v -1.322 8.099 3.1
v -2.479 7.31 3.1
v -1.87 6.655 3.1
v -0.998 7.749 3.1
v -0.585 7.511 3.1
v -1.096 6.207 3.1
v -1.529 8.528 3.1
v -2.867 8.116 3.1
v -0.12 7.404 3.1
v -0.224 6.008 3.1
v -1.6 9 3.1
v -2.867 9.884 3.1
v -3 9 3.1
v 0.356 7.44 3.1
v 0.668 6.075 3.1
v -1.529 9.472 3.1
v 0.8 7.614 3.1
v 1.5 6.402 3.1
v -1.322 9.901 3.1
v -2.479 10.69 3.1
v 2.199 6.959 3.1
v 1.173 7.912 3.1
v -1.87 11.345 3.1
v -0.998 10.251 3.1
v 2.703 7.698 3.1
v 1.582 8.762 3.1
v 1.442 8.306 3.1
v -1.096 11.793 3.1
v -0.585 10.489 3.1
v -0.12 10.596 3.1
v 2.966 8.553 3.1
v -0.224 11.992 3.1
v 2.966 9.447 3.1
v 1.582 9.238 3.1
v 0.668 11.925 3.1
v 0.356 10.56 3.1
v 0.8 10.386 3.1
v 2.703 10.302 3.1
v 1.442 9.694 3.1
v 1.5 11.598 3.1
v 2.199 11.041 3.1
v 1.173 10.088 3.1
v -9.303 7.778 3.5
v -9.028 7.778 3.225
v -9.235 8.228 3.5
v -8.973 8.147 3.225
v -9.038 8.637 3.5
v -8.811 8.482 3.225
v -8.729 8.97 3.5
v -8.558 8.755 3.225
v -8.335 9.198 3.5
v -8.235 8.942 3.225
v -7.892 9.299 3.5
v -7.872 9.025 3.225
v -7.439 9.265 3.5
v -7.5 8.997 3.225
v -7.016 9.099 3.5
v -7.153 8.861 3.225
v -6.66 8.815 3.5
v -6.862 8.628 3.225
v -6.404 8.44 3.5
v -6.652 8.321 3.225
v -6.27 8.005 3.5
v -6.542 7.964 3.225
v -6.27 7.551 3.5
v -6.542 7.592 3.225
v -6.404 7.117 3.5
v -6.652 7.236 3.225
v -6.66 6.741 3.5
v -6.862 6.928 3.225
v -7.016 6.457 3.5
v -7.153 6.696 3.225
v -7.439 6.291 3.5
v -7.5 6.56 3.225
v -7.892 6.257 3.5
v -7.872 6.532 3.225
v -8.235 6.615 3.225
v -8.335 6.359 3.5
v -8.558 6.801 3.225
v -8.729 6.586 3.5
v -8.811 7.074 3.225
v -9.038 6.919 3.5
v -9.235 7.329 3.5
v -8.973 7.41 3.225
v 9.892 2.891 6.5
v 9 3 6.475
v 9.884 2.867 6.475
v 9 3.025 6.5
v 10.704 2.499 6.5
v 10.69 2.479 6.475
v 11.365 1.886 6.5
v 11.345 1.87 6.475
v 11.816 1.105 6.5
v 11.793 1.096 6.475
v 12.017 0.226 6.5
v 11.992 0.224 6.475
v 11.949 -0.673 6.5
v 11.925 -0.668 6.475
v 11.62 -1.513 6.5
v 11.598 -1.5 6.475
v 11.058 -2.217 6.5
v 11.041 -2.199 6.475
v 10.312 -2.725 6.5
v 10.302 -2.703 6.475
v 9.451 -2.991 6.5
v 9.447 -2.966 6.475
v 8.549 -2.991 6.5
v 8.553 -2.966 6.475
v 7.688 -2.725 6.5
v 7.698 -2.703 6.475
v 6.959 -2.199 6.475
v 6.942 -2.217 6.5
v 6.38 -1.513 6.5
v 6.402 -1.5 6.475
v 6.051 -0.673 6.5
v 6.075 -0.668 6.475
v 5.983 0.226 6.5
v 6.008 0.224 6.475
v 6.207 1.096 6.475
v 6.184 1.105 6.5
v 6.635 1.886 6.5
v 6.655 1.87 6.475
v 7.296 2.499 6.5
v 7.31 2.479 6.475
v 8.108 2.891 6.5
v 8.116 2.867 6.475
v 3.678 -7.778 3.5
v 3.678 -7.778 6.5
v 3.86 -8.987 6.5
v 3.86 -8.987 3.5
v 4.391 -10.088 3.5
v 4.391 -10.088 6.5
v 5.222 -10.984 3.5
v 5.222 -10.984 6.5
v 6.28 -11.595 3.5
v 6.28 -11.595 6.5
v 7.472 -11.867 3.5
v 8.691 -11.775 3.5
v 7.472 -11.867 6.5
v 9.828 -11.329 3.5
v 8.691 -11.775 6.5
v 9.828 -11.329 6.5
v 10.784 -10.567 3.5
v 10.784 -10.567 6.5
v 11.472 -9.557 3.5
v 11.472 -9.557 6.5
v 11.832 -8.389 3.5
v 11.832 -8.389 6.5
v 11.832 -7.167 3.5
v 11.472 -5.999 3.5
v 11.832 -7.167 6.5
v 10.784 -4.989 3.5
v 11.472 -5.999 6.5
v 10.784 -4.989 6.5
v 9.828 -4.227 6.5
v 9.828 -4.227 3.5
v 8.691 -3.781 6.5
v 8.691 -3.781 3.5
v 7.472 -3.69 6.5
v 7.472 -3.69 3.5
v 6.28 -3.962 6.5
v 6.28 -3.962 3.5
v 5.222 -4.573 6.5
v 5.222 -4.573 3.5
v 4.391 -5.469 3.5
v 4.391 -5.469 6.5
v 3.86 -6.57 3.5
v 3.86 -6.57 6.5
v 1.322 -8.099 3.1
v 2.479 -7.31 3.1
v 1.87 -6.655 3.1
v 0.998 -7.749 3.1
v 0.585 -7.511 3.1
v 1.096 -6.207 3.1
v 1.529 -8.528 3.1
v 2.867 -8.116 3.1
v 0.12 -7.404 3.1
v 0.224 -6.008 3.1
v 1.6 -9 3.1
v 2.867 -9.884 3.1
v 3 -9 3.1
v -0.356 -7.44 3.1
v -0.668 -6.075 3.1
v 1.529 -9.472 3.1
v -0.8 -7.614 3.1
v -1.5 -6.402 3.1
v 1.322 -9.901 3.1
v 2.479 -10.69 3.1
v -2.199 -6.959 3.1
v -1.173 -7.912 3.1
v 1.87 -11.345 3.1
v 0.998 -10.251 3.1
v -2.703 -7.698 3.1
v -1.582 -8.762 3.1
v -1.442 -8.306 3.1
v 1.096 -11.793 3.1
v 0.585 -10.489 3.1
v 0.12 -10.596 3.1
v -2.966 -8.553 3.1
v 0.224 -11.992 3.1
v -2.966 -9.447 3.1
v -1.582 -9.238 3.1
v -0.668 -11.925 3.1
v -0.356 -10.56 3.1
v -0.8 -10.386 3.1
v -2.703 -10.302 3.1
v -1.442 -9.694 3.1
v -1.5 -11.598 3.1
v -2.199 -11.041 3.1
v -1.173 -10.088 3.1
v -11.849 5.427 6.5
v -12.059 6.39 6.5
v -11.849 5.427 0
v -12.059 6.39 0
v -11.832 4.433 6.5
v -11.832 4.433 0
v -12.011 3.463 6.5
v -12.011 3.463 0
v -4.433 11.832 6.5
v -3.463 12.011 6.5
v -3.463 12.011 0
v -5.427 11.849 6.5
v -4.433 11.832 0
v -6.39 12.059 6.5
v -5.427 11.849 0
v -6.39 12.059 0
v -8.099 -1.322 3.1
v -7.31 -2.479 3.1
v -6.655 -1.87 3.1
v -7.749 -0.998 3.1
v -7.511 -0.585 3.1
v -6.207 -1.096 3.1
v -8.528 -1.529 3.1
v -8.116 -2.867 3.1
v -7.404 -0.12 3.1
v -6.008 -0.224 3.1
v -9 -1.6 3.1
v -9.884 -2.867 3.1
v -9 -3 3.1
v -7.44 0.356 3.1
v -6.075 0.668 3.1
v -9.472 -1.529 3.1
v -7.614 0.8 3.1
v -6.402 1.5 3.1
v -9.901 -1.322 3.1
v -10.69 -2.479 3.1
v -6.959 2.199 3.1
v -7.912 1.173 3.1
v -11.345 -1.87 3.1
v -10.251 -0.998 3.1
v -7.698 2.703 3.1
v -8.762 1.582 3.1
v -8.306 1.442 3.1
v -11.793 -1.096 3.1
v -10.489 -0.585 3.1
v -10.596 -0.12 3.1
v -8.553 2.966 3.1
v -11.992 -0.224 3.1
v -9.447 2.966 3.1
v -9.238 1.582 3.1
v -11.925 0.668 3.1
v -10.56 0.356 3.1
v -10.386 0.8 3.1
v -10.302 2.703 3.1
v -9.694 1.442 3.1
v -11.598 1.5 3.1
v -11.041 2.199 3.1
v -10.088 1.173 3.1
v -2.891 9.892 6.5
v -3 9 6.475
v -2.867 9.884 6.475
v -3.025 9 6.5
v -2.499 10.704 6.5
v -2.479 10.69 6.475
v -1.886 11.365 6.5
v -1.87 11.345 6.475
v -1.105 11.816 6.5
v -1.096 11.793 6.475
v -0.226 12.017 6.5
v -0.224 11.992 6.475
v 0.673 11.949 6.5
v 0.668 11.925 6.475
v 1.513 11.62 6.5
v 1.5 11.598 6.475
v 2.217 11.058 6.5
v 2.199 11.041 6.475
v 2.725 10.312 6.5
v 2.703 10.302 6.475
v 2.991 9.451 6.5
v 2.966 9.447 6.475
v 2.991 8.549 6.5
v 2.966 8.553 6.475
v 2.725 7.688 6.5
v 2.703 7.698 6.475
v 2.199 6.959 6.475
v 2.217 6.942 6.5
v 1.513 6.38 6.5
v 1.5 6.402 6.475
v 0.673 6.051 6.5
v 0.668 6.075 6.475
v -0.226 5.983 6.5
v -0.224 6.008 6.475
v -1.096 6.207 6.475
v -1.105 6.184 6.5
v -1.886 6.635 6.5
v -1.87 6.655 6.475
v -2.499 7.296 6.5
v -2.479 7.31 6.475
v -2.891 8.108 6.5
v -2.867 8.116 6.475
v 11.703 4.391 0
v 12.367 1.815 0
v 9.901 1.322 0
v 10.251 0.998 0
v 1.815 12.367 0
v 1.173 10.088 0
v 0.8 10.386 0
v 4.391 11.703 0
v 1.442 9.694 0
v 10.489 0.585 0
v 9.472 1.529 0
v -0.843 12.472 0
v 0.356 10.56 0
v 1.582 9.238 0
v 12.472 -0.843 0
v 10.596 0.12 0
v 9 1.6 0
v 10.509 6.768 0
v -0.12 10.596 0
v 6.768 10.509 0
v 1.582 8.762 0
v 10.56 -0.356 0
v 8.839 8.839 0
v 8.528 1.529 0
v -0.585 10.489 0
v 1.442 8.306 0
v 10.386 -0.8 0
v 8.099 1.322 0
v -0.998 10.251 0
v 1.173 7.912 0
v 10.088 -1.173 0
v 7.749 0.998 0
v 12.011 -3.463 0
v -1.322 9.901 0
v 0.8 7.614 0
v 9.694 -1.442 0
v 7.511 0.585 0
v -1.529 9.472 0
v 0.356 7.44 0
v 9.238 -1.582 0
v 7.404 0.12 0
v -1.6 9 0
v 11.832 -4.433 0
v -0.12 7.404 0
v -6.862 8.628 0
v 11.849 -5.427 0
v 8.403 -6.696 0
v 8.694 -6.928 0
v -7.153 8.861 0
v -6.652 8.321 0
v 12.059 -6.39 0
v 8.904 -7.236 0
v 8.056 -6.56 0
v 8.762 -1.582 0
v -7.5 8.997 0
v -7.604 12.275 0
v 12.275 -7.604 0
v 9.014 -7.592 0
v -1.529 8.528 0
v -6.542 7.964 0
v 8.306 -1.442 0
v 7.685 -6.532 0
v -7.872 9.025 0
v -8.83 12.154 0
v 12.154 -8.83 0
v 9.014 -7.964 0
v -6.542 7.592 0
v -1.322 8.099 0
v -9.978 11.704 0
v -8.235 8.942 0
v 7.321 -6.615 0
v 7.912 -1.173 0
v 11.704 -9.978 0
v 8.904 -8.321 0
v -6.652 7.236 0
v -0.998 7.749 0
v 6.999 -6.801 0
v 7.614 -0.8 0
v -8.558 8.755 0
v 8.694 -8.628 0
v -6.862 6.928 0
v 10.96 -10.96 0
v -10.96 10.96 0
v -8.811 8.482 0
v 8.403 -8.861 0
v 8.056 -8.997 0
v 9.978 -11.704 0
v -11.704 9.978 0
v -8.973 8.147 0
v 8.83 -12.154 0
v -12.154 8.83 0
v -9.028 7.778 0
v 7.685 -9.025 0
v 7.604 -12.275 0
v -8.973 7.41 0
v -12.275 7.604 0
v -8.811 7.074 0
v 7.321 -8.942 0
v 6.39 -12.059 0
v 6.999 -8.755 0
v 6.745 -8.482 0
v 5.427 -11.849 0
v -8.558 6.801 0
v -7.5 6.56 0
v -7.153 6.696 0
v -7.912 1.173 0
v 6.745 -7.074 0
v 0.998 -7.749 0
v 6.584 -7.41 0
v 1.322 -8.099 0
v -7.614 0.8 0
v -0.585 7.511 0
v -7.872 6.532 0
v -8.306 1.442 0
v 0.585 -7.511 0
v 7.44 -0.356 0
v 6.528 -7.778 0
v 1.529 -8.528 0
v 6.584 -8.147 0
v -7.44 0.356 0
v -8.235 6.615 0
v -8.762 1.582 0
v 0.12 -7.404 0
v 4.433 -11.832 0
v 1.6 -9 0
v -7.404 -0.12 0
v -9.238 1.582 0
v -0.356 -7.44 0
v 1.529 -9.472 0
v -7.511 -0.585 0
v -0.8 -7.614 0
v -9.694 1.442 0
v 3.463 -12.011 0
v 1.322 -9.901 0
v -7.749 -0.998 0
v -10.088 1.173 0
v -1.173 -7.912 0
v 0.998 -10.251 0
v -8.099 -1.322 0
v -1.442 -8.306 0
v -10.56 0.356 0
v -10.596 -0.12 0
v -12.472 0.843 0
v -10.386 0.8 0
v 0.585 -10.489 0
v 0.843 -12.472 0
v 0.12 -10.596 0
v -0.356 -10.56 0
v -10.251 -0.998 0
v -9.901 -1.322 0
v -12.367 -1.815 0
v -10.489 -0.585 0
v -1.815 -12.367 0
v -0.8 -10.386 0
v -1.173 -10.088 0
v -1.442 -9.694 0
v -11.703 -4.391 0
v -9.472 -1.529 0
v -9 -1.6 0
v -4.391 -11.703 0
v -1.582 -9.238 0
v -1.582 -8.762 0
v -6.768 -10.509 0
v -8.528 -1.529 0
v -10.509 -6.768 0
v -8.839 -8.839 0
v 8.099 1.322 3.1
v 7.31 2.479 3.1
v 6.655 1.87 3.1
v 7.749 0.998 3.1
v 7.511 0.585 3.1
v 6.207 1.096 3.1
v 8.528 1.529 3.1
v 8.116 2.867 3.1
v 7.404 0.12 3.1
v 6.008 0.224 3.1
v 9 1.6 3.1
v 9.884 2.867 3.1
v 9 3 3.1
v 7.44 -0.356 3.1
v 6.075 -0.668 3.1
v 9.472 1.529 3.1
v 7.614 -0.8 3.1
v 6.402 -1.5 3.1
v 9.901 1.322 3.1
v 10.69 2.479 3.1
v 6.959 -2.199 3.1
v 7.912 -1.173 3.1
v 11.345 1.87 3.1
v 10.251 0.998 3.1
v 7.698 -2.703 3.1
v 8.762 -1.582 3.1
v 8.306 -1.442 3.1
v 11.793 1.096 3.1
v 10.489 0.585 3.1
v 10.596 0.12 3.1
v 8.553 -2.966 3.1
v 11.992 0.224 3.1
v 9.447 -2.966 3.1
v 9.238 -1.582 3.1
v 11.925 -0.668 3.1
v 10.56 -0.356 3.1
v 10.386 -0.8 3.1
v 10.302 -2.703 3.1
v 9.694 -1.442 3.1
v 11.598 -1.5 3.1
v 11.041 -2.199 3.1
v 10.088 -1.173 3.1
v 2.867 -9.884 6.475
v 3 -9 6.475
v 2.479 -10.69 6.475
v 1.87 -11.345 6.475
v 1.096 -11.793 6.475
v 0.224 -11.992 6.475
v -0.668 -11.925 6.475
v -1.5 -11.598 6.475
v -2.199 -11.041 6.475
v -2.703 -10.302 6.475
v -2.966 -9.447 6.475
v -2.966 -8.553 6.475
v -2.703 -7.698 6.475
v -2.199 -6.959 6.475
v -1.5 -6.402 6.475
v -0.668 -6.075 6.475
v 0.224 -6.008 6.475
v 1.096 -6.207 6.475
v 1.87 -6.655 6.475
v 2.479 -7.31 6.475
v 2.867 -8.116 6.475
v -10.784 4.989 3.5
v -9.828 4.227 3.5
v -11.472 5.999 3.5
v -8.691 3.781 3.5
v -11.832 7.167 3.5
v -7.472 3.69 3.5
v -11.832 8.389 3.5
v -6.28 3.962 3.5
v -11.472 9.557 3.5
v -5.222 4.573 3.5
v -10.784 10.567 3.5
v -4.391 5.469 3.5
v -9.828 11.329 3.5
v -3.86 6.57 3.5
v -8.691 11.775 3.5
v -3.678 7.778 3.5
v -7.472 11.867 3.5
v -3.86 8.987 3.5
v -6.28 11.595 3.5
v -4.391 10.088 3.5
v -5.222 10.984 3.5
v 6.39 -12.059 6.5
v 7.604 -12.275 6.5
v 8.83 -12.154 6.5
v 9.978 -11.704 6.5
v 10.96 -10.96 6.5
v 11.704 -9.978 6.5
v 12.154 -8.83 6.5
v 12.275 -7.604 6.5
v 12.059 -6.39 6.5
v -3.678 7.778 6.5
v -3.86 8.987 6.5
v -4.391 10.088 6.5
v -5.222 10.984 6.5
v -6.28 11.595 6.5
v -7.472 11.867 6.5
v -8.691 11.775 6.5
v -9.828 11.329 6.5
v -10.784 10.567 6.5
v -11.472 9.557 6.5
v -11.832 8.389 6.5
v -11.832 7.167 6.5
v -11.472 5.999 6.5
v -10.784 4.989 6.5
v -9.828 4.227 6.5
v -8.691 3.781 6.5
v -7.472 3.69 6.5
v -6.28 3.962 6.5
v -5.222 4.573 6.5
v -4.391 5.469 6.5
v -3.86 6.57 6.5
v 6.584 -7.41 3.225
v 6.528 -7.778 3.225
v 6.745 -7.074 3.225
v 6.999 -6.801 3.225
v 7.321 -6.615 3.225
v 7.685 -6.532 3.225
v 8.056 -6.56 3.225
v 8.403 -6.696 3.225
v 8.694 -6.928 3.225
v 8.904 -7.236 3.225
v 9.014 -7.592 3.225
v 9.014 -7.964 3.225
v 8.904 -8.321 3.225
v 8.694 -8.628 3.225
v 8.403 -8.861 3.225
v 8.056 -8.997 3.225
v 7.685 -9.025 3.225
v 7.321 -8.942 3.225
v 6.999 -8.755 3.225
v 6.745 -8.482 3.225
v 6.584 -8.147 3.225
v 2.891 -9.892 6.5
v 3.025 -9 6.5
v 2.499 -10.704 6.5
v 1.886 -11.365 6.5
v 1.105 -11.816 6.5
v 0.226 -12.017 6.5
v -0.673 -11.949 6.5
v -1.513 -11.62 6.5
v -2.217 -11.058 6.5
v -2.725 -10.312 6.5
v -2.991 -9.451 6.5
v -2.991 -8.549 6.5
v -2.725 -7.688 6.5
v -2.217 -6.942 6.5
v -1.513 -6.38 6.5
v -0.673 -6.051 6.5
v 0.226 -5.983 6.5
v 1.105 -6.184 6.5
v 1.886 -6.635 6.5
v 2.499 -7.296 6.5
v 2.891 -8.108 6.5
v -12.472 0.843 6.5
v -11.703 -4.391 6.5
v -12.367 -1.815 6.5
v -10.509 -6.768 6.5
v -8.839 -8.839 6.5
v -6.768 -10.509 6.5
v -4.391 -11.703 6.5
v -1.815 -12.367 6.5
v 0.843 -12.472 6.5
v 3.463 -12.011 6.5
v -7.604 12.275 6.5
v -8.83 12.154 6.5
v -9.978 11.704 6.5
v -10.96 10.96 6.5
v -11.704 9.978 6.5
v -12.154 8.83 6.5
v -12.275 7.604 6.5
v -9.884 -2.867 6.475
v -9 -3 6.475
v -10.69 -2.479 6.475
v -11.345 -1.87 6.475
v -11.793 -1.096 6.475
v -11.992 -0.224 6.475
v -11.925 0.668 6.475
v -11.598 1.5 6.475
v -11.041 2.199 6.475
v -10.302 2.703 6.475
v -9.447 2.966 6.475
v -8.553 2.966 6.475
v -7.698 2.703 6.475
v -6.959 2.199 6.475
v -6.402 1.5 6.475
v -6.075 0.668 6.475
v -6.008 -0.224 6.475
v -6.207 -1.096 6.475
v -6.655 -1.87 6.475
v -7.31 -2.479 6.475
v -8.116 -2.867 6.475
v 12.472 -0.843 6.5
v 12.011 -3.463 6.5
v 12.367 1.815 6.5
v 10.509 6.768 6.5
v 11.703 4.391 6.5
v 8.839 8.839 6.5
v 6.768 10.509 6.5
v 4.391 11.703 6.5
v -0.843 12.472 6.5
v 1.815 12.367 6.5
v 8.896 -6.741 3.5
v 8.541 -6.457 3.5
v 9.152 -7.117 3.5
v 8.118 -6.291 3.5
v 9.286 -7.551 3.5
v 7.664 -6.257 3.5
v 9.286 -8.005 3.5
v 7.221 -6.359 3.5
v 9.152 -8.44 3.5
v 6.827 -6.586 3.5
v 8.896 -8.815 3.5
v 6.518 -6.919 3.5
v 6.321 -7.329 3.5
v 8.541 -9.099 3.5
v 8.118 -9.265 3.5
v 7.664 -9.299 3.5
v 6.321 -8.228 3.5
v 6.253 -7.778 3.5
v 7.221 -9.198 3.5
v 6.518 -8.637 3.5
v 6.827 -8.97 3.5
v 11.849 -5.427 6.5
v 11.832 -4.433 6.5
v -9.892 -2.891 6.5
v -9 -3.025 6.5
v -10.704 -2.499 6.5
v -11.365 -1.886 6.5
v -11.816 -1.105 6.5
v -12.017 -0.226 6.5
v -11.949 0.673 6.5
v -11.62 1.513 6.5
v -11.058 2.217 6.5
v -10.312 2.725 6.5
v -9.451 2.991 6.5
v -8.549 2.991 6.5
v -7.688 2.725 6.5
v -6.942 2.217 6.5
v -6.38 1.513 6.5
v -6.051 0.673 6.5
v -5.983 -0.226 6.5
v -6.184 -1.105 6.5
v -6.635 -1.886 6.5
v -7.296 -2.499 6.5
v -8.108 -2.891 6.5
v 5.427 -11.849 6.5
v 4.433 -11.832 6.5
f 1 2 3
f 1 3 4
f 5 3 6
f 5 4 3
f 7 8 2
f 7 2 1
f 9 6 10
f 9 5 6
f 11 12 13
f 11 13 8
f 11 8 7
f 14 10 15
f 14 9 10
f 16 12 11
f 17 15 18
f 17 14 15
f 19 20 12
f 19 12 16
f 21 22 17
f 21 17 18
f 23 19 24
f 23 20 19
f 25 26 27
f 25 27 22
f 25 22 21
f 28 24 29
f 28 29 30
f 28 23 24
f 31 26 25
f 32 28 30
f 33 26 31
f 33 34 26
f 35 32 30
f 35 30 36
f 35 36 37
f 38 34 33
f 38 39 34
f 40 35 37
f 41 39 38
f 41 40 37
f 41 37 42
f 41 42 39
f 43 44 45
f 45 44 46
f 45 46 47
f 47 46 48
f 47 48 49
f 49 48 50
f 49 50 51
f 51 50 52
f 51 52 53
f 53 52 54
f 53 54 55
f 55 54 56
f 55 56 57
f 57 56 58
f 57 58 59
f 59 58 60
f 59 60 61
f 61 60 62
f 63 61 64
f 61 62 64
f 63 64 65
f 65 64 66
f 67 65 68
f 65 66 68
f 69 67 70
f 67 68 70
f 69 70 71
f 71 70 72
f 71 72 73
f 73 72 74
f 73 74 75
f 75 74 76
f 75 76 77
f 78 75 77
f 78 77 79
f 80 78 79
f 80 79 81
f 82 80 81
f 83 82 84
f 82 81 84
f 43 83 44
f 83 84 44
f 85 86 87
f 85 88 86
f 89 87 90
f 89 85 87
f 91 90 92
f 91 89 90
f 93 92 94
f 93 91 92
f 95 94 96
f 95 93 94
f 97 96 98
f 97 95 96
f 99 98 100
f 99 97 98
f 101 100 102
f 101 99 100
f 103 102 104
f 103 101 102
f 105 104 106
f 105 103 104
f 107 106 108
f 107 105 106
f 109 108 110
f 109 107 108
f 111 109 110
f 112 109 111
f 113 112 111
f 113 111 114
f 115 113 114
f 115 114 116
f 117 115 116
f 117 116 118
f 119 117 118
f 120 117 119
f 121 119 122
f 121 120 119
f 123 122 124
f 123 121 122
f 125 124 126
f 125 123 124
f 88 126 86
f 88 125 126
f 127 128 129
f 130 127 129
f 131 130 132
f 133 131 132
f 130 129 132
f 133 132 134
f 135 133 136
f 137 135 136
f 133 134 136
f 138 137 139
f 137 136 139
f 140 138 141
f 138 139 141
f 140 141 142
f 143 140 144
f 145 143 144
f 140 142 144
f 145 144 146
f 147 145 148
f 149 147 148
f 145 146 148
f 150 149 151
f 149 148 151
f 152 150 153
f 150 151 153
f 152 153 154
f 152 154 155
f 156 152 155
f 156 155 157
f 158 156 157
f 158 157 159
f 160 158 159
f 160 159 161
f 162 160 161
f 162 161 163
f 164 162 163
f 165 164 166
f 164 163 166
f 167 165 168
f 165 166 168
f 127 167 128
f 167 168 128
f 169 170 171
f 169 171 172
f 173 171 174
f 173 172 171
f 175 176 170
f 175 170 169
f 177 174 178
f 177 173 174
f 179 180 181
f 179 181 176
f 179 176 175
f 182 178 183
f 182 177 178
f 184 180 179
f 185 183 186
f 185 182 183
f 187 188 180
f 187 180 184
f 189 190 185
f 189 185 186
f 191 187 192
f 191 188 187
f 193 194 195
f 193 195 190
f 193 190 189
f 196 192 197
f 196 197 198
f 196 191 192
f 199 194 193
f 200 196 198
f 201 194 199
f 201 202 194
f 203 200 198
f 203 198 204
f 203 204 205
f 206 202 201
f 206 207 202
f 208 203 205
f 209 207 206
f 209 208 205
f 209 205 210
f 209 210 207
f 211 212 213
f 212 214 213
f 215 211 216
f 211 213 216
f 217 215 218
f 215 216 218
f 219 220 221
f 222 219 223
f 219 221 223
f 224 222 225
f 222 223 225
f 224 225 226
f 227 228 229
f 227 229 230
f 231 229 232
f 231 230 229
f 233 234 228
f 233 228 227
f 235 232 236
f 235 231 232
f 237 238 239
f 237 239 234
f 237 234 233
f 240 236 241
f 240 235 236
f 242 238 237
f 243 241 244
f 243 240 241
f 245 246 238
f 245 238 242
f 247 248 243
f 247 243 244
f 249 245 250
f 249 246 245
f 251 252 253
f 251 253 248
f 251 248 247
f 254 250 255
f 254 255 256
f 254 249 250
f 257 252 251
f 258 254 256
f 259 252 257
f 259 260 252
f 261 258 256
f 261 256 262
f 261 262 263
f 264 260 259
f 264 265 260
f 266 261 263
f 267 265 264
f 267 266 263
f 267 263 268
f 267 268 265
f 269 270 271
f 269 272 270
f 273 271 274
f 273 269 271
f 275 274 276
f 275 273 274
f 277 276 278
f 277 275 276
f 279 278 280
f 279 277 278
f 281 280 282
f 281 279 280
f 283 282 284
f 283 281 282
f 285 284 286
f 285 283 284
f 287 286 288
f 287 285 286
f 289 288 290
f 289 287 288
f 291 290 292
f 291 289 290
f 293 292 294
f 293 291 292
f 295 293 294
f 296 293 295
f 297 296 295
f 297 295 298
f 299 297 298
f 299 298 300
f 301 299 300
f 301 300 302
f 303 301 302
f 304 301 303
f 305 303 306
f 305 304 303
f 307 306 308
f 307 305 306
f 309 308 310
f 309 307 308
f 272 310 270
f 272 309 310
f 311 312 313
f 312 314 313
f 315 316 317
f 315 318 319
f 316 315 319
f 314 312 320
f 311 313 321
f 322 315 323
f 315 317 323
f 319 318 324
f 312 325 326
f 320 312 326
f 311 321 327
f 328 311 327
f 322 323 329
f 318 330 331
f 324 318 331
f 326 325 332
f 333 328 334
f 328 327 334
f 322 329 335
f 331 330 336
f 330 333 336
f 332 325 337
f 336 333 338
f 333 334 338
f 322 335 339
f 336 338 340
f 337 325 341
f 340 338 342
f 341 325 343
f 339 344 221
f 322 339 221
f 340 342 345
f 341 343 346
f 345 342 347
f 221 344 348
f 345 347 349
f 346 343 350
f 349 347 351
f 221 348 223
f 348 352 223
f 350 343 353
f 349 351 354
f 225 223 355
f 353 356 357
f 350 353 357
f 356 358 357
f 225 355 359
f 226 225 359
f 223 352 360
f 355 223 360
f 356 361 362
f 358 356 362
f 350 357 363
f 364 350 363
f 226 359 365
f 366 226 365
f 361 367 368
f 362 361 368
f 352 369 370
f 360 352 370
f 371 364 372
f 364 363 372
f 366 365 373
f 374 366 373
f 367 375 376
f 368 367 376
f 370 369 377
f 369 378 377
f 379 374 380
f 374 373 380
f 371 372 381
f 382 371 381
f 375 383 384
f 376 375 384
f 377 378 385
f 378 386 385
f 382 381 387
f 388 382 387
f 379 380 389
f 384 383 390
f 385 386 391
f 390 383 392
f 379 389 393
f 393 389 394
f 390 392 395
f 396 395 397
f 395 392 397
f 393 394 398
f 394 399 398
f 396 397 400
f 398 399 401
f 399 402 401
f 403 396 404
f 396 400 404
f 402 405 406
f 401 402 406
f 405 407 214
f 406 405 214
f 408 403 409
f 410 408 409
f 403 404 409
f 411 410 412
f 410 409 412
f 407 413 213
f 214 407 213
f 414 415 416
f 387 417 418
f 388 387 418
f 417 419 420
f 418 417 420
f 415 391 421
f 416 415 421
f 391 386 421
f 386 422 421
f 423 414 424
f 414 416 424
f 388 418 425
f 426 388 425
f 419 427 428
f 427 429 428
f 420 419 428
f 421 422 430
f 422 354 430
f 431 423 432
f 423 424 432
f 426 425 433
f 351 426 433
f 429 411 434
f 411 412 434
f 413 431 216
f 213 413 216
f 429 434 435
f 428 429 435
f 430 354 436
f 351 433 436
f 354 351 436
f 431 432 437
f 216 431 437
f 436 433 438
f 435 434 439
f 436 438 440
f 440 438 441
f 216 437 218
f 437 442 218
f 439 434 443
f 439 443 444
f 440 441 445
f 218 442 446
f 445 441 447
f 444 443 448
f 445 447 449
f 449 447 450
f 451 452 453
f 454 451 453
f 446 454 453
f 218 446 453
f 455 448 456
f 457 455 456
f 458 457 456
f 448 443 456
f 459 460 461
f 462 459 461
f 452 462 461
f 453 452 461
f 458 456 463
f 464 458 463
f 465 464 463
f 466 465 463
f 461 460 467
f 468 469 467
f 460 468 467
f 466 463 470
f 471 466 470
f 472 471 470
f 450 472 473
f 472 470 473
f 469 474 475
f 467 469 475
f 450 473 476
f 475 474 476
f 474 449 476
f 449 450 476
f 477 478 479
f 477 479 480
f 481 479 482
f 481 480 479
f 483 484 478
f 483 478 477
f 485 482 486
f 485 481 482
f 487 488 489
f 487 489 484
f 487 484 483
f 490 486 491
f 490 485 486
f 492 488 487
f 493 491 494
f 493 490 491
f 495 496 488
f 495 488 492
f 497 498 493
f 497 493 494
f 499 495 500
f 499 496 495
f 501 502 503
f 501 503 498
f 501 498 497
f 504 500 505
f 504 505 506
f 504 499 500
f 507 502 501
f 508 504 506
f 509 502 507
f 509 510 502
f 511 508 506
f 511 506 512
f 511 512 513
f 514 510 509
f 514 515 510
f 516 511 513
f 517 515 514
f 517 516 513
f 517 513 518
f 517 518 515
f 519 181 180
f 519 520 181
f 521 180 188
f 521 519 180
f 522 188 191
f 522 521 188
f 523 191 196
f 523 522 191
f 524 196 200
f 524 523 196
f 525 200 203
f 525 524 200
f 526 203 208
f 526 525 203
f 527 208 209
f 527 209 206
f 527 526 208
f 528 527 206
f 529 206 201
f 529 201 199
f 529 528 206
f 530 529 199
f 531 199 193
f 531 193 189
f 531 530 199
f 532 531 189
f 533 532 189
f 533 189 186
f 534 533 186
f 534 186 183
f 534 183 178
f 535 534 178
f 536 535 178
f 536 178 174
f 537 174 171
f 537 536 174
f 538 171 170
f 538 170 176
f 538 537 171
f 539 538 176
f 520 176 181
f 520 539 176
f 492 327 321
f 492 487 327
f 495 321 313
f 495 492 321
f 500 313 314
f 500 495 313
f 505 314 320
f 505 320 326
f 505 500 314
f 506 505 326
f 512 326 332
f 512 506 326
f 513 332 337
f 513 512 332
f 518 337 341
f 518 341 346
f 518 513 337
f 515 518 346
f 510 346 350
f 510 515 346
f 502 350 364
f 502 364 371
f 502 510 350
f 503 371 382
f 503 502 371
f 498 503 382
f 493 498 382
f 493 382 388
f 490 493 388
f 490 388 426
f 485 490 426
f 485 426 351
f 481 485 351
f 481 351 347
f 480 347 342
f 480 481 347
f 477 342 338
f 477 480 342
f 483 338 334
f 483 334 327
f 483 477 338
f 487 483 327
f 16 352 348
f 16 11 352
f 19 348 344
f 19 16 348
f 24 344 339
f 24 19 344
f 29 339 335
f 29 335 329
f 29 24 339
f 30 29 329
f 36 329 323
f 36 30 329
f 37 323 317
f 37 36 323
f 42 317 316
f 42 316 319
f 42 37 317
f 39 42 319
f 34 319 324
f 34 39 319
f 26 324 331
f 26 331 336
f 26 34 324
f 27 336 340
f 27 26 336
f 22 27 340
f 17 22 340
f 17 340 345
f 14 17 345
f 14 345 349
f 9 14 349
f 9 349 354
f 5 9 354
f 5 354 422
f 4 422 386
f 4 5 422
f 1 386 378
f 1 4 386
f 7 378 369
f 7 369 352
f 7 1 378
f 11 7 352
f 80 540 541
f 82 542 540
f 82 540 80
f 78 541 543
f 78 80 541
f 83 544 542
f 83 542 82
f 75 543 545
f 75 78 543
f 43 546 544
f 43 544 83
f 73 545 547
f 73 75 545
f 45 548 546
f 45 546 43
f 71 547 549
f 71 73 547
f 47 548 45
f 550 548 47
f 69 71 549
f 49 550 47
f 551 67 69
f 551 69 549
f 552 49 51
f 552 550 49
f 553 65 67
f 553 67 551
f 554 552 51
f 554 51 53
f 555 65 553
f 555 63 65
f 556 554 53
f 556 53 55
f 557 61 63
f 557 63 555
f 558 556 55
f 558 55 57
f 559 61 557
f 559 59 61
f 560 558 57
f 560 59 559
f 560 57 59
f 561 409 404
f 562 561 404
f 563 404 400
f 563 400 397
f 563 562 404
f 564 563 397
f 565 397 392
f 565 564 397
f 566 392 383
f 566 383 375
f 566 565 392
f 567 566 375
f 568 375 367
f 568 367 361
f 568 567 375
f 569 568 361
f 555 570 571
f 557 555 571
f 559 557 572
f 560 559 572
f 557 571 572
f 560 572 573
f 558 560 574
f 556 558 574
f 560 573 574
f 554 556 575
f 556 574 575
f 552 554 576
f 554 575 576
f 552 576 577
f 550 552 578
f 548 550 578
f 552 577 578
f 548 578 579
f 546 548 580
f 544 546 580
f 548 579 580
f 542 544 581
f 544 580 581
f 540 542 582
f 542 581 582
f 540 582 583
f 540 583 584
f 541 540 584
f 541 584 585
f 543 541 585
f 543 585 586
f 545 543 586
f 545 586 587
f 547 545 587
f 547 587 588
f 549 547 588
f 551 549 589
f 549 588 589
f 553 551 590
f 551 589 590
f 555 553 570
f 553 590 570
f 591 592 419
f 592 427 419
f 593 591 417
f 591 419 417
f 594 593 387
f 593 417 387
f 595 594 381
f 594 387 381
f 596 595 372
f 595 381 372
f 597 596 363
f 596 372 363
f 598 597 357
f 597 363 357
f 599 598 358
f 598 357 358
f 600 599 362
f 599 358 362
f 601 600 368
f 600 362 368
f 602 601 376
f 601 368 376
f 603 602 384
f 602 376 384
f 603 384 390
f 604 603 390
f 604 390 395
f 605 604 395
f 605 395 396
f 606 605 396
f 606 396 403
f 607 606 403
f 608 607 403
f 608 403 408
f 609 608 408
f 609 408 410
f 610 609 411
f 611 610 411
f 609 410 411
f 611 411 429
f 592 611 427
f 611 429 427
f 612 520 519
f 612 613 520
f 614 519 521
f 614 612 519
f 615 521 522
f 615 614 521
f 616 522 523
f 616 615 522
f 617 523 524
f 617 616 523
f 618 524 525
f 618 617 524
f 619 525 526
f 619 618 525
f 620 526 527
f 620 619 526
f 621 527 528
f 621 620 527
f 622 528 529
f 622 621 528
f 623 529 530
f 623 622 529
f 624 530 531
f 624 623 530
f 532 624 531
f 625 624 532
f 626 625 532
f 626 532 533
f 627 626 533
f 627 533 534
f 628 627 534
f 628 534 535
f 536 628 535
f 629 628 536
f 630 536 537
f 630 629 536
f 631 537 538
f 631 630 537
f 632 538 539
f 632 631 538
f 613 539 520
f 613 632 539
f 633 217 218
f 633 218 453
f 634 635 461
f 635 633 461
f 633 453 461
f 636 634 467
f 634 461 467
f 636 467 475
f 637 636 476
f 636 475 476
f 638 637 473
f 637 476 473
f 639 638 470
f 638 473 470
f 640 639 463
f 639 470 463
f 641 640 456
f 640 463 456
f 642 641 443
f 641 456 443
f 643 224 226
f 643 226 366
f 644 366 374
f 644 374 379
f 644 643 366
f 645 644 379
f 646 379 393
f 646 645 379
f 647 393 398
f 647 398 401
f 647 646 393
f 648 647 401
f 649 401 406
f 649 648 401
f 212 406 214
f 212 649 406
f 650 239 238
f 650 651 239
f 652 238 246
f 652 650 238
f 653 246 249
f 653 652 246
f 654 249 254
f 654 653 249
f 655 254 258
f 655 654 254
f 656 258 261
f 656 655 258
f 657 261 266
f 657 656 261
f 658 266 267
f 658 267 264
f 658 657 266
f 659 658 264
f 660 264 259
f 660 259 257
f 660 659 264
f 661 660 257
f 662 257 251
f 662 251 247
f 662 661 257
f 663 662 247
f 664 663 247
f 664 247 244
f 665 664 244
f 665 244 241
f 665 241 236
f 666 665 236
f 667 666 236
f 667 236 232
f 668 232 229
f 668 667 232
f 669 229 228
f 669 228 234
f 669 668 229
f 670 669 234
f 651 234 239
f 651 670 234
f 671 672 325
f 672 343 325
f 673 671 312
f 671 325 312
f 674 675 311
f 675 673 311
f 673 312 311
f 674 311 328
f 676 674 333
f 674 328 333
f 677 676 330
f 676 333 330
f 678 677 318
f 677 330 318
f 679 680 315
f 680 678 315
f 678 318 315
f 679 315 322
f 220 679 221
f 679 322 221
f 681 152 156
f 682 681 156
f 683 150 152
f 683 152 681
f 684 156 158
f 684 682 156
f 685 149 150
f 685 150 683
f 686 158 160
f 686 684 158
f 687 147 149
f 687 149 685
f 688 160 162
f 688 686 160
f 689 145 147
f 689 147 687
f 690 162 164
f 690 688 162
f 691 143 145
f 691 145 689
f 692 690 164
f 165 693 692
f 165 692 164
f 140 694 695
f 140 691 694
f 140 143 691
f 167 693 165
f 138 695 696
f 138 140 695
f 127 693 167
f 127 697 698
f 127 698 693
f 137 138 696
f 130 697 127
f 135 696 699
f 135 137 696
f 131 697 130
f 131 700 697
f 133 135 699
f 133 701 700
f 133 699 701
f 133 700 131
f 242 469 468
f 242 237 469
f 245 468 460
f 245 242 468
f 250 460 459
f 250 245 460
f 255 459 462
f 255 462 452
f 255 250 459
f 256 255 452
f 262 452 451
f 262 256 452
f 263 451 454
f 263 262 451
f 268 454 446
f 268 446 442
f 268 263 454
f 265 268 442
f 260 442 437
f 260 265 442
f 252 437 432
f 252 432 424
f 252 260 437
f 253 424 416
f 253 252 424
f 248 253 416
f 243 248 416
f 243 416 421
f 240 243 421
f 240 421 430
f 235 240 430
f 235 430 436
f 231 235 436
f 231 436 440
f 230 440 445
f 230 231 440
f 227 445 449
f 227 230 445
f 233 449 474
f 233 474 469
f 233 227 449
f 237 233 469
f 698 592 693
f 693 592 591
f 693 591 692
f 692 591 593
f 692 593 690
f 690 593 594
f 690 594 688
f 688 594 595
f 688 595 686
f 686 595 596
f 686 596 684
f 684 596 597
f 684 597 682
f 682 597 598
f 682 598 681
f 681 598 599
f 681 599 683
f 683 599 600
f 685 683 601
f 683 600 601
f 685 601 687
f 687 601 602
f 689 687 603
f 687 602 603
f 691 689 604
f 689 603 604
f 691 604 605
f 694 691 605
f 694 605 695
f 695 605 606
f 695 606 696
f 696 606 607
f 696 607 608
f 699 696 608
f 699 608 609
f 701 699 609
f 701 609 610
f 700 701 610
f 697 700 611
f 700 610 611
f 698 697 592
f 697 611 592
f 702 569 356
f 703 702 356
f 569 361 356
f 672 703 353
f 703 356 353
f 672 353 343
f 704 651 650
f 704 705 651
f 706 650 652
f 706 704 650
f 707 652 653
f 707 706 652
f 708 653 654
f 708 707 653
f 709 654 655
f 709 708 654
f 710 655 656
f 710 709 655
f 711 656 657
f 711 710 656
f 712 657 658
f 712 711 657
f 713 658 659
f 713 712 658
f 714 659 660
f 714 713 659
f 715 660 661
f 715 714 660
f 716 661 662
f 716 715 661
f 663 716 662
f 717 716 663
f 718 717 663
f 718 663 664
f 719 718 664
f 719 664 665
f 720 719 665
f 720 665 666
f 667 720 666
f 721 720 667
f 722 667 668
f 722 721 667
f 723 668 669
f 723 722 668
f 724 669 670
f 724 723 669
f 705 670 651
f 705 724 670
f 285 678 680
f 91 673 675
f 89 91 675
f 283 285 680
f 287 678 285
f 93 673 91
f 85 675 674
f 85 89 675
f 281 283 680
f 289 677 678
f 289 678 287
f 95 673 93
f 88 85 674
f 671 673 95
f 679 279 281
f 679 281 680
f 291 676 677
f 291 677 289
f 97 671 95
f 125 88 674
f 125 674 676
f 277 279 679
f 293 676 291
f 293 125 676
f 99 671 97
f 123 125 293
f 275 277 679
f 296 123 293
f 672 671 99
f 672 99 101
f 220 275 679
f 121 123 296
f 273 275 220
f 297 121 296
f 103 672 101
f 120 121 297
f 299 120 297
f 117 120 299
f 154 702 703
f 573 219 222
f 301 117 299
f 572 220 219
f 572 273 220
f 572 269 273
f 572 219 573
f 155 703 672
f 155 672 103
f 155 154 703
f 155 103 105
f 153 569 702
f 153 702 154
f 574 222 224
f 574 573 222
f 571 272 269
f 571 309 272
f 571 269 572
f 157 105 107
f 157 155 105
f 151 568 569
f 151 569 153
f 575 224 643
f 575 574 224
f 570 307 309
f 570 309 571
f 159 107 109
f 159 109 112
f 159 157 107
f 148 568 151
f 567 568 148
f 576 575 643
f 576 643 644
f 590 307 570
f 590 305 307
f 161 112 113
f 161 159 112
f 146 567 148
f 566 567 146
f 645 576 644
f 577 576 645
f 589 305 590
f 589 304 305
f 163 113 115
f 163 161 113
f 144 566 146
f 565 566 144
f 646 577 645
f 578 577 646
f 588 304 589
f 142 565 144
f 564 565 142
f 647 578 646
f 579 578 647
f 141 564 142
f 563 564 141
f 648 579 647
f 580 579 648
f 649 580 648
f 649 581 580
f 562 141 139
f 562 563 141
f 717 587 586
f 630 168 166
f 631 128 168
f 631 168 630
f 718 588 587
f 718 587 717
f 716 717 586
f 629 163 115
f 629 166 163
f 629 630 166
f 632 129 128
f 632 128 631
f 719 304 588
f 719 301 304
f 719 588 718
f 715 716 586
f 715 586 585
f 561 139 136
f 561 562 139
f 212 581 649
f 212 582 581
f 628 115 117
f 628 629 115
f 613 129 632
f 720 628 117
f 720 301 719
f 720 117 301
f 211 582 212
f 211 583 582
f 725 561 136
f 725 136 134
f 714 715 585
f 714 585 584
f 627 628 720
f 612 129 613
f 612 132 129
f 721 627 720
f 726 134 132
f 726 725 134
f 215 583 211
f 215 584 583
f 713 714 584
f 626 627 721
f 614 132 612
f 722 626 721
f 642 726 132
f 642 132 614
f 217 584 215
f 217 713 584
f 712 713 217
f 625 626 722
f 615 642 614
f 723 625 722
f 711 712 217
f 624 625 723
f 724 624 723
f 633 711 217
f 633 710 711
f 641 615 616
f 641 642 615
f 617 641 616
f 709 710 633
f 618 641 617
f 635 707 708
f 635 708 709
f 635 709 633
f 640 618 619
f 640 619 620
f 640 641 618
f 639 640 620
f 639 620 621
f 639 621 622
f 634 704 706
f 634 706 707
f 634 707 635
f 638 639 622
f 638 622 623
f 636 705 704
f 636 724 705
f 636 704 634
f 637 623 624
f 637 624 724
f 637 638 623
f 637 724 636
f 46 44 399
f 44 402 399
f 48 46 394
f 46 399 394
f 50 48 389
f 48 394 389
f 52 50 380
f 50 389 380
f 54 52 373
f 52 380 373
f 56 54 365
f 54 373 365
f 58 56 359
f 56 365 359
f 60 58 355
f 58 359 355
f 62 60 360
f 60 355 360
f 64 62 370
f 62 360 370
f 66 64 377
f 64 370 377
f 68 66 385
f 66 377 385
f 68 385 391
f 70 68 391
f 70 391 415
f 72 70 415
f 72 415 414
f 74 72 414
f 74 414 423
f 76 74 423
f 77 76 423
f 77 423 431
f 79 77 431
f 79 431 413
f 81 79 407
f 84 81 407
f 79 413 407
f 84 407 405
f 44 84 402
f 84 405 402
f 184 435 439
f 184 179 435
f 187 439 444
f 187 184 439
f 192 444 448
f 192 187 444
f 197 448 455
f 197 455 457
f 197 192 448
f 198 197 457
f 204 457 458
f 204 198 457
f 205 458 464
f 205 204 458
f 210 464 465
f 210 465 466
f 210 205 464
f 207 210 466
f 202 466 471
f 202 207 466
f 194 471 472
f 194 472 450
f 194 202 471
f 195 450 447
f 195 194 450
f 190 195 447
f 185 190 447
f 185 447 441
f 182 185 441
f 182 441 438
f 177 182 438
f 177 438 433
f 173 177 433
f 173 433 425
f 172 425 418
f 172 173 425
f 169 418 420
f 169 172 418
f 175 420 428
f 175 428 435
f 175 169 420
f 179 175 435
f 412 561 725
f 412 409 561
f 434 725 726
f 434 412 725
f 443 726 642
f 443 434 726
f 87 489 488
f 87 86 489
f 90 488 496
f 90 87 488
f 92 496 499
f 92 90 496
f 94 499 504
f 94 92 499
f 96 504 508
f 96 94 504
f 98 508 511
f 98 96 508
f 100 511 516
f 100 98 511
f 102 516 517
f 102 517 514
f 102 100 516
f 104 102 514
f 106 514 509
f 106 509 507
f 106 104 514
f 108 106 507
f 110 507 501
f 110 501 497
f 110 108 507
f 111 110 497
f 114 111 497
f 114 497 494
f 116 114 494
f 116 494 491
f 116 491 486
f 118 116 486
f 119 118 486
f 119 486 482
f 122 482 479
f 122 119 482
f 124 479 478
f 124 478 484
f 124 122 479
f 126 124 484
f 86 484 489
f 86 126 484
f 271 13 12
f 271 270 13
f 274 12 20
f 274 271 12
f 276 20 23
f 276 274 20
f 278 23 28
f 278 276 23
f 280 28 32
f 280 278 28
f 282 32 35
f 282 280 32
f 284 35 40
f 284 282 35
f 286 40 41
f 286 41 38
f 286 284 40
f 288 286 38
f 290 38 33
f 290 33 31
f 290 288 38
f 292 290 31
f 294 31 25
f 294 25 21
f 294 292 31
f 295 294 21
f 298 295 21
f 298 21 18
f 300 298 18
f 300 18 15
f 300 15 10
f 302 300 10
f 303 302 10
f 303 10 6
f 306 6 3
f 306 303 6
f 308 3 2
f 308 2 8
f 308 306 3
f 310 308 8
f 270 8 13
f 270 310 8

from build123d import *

# Parameters (mm, degrees)
SKETCH1_R                   = 12.5
BOSS_EXTRUDE1_DEPTH         = 6.5
CIRPATTERN1_COUNT           = 4
SKETCH5_R                   = 4.5
BOSS_EXTRUDE3_DEPTH         = 6.5
SKETCH7_R                   = 4.1
CUT_EXTRUDE2_DEPTH          = 3
CIRPATTERN3_COUNT           = 2
FILLET2_R                   = 5
M3_TAPPED_HOLE1_D           = 2.5
M3_TAPPED_HOLE1_CSINK_D     = 3.05
M3_TAPPED_HOLE1_CSINK_ANGLE = 90


with BuildPart() as part:
    # Sketch1 → Boss-Extrude1 (new body)
    with BuildSketch(Plane.XY):
        with Locations(Location((0, 0, 0), (0, 0, 180))):
            Circle(SKETCH1_R)
    extrude(amount=BOSS_EXTRUDE1_DEPTH)

    # Sketch4 → CBORE for M3 Hexagon socket head cap screws1 (revolve, cut)
    with BuildSketch(Plane(origin=(-9, 0, 6.5), x_dir=(0, -1, 0), z_dir=(1, 0, 0))):
        Polygon((0, 0), (0, 6.5), (1.6, 6.5), (1.6, 3.4), (3, 3.4), (3, 0.025), (3.025, 0), align=None)
    cbore_for_m3_hexagon_socket_head_cap_scr = revolve(axis=Axis((-9, 0, 12.85), (0, 0, -1)), mode=Mode.SUBTRACT)

    # CirPattern1: CBORE for M3 Hexagon socket head cap screws1 ×4 about axis
    cirpattern1_axis = Axis((0, 0, 0), (0, 0, 1))
    for i in range(1, CIRPATTERN1_COUNT):
        add(cbore_for_m3_hexagon_socket_head_cap_scr.rotate(cirpattern1_axis, i * 360 / CIRPATTERN1_COUNT), mode=Mode.SUBTRACT)

    # Sketch5 → Boss-Extrude3 (add)
    with BuildSketch(Plane.XY.offset(6.5)):
        with Locations((-7.778174593, 7.778174593)):
            Circle(SKETCH5_R)
    boss_extrude3 = extrude(amount=-BOSS_EXTRUDE3_DEPTH)

    # Sketch7 → Cut-Extrude2 (cut)
    with BuildSketch(Plane.XY.offset(6.5)):
        with Locations((-7.778174593, 7.778174593)):
            Circle(SKETCH7_R)
    cut_extrude2 = extrude(amount=-CUT_EXTRUDE2_DEPTH, mode=Mode.SUBTRACT)

    # CirPattern3: Boss-Extrude3, Cut-Extrude2 ×2 about axis
    cirpattern3_axis = Axis((0, 0, 0), (0, 0, 1))
    add([boss_extrude3.rotate(cirpattern3_axis, i * 360 / CIRPATTERN3_COUNT) for i in range(1, CIRPATTERN3_COUNT)])
    add([cut_extrude2.rotate(cirpattern3_axis, i * 360 / CIRPATTERN3_COUNT) for i in range(1, CIRPATTERN3_COUNT)], mode=Mode.SUBTRACT)

    # Fillet2
    fillet2_edges = [part.edges().sort_by_distance(p)[0] for p in [
        (-5.115048509, 11.405537197, 3.25),
        (-11.405537197, 5.115048509, 3.25),
        (5.115048509, -11.405537197, 3.25),
        (11.405537197, -5.115048509, 3.25),
    ]]
    fillet(fillet2_edges, radius=FILLET2_R)

    # M3 Tapped Hole1 (through all)
    with Locations(Plane(origin=(-7.778174593, 7.778174593, 3.5), x_dir=(1, 0, 0), z_dir=(0, 0, 1))):
        with Locations((0, 0), (15.556349186, -15.556349186)):
            CounterSinkHole(M3_TAPPED_HOLE1_D / 2, M3_TAPPED_HOLE1_CSINK_D / 2, counter_sink_angle=M3_TAPPED_HOLE1_CSINK_ANGLE)


solid = part.part
